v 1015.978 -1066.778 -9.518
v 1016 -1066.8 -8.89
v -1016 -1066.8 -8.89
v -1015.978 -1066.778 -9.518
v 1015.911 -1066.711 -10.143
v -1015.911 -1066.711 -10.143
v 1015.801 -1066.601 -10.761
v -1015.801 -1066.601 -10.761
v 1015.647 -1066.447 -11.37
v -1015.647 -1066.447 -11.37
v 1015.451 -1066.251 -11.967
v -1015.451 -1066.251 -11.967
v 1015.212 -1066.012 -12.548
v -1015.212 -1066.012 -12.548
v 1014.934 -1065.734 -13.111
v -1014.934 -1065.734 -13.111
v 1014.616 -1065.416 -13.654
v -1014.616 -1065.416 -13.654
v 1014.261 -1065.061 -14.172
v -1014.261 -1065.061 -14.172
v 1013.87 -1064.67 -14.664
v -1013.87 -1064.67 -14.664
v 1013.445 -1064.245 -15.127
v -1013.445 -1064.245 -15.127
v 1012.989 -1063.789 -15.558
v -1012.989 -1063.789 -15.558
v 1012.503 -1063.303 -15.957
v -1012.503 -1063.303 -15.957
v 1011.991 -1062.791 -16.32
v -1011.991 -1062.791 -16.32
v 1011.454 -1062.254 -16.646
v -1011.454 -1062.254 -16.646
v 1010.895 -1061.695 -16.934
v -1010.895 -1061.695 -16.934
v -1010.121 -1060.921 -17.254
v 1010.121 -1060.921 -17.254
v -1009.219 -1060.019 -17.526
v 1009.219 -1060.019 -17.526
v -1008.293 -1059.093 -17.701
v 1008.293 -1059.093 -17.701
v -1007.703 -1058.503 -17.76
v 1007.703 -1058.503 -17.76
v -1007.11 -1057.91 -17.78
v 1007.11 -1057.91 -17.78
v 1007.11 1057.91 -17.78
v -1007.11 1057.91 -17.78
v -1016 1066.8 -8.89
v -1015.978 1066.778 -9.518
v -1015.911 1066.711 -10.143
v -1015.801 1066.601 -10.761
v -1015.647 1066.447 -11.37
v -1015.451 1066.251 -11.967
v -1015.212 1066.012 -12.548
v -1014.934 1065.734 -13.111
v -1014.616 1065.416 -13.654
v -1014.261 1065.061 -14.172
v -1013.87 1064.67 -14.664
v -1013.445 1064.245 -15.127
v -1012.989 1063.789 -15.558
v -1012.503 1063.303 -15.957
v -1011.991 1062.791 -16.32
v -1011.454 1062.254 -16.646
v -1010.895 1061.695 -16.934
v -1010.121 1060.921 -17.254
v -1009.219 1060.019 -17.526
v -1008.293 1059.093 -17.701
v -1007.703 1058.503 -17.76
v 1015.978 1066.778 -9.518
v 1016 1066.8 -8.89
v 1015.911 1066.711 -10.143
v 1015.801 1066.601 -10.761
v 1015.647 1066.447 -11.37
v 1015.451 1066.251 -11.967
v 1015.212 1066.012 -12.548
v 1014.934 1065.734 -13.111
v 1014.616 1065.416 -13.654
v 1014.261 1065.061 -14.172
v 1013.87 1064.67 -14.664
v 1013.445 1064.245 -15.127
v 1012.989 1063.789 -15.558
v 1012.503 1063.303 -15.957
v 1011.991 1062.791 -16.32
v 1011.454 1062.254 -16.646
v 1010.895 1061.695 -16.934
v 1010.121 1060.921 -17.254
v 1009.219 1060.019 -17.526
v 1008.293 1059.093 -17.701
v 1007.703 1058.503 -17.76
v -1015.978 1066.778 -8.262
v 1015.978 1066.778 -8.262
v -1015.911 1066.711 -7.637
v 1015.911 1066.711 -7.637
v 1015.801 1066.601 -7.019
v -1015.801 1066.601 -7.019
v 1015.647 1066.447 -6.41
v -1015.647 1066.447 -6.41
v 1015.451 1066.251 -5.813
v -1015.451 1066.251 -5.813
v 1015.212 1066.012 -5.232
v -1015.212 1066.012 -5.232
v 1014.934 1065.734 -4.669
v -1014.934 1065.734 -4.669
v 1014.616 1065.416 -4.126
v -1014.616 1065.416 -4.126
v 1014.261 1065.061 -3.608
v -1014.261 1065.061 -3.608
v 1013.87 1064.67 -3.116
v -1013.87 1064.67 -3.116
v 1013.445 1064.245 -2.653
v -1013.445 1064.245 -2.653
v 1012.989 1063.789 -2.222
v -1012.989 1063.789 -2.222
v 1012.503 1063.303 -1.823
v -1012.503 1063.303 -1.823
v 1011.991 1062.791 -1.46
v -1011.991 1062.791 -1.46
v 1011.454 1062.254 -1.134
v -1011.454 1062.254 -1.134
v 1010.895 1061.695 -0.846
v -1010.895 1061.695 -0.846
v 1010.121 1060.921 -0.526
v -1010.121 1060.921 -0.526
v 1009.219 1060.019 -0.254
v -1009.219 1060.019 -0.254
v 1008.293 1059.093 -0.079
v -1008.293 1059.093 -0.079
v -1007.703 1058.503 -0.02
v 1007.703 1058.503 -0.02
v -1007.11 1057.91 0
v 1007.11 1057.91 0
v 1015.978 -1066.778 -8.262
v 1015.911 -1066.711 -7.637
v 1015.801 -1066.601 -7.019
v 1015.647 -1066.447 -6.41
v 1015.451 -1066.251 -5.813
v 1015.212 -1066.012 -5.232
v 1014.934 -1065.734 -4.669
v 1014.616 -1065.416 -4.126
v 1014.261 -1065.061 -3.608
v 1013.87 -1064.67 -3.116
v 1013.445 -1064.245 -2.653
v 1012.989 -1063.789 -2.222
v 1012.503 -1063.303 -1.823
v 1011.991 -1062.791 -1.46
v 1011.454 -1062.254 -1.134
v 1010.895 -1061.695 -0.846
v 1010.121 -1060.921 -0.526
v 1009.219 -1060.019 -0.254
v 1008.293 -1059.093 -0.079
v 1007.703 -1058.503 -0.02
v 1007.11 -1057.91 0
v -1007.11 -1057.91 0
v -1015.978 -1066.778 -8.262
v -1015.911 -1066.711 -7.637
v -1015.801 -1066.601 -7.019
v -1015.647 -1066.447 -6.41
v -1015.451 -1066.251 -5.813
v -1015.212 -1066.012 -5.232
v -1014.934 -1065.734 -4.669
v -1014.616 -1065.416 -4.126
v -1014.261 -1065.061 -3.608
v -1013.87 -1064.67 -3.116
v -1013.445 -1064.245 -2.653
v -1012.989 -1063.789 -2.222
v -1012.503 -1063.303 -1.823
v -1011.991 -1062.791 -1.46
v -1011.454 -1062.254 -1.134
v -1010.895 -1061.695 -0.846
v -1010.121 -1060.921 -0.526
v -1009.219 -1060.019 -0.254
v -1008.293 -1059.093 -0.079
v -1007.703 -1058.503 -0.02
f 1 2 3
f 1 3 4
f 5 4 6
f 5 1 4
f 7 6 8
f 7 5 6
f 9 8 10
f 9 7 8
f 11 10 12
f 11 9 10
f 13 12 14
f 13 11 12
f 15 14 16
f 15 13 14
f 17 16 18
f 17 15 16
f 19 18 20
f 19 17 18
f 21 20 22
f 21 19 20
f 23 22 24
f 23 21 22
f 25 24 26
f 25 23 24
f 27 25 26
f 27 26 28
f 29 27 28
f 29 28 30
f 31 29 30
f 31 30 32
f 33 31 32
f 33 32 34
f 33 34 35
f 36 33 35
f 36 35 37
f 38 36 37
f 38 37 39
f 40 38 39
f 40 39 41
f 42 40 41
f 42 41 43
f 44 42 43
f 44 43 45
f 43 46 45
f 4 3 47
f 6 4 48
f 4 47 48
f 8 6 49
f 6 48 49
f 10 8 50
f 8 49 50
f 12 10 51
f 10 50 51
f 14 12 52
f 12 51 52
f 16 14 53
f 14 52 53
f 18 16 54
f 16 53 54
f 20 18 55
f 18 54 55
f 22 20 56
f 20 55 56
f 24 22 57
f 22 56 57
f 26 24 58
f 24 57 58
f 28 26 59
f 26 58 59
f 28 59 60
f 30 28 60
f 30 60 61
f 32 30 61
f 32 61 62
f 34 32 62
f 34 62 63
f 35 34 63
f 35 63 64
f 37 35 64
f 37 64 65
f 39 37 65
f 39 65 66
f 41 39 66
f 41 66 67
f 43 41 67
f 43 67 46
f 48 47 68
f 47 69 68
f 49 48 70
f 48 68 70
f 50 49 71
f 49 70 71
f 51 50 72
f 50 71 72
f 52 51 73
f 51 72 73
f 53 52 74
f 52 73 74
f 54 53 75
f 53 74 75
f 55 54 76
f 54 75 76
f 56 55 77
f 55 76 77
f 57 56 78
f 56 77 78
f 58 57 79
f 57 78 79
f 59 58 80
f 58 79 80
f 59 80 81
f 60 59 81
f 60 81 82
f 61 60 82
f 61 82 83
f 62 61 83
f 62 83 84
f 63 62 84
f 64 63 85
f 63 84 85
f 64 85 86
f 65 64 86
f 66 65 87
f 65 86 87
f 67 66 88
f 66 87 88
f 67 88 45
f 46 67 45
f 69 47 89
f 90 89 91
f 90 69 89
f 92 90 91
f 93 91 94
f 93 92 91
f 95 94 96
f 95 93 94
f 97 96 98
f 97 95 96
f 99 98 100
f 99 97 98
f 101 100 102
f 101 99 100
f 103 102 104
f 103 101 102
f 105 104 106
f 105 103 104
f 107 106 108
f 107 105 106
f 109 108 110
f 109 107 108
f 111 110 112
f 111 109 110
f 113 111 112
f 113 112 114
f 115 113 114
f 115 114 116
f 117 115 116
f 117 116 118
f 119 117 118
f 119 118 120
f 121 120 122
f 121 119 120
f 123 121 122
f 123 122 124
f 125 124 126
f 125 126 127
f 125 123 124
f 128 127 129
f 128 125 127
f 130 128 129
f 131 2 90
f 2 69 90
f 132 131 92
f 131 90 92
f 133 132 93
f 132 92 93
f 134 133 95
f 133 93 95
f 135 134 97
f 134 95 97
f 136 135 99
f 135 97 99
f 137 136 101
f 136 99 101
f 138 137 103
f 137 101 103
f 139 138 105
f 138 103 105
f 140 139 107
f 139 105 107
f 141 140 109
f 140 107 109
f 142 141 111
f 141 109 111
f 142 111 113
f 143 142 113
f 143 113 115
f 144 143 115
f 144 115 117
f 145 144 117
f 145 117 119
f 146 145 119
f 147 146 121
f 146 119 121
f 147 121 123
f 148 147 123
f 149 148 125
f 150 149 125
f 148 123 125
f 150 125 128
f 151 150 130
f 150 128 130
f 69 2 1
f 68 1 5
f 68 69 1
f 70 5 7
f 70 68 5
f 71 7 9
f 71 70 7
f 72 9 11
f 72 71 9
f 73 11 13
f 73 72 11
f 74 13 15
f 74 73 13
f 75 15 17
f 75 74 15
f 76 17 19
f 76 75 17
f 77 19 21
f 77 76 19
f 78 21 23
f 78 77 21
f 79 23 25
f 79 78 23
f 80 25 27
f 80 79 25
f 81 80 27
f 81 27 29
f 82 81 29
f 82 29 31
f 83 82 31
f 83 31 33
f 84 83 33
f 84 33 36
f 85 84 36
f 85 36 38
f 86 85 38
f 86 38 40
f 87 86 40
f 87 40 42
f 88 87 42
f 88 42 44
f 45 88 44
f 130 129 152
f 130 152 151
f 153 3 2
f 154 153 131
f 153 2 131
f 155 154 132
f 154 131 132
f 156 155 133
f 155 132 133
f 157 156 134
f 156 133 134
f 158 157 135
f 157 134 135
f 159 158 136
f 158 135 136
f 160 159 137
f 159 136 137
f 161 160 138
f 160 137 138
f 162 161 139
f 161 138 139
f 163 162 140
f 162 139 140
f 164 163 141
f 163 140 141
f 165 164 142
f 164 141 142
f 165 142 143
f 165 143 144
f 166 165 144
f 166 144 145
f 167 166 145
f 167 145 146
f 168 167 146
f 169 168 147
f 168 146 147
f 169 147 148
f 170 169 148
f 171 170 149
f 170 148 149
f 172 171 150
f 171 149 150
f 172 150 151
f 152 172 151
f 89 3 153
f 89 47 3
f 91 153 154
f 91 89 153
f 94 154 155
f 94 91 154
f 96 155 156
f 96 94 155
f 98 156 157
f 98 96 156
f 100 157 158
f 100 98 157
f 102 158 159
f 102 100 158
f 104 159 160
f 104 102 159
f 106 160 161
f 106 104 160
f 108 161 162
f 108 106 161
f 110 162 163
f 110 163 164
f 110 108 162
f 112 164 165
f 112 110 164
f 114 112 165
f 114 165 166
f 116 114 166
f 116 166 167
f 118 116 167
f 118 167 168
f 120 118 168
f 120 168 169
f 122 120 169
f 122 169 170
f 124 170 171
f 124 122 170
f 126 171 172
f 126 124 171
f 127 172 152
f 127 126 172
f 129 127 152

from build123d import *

# Parameters (mm, degrees)
F0_W     = 2032
F0_H     = 2133.6
F1_DEPTH = 17.78
F2_R     = 8.88999


# Not quite as in the source:
# - a fillet or chamfer is up to 0.001 mm smaller than in the source, because OpenCascade refuses the exact size


with BuildPart() as f1:
    # F0 (on Top) → F1 (new body)
    with BuildSketch(Plane.XY):
        Rectangle(F0_W, F0_H)
    extrude(amount=-F1_DEPTH)

    # F2 (radius 8.89 in the source; OpenCascade refuses exactly that, so slightly less here)
    f2_edges = [f1.edges().sort_by_distance(p)[0] for p in [
        (1016, 0, 0),
        (0, 1066.8, 0),
        (-1016, 0, 0),
        (0, -1066.8, 0),
        (0, -1066.8, -17.78),
        (-1016, 0, -17.78),
        (0, 1066.8, -17.78),
        (1016, 0, -17.78),
    ]]
    fillet(f2_edges, radius=F2_R)


solid = f1.part
